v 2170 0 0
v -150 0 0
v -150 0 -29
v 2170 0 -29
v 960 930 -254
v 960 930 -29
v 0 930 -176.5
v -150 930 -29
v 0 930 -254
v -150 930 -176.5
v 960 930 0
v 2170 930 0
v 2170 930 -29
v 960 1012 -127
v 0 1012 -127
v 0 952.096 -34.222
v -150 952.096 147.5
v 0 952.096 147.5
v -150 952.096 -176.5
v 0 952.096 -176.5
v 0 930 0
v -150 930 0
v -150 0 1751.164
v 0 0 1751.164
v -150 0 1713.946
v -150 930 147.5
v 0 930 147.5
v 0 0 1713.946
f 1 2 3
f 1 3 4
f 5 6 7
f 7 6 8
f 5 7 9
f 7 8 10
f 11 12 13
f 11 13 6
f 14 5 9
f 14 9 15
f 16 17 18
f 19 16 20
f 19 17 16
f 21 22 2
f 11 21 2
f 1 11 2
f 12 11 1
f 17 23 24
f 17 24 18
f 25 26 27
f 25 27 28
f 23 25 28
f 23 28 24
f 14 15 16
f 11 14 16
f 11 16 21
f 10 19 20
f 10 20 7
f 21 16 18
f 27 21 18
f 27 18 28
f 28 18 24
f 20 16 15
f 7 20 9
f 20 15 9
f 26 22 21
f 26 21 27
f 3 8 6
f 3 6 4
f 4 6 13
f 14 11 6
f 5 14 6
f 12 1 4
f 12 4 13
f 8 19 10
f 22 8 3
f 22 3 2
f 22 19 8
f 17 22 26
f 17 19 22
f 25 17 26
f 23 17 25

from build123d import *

# Parameters (mm, degrees)
SKETCH1_W           = 2170
SKETCH1_H           = 930
SKETCH1_W_2         = 150
BOSS_EXTRUDE1_DEPTH = 29
BOSS_EXTRUDE2_DEPTH = 150
BOSS_EXTRUDE3_DEPTH = 960


with BuildPart() as part:
    # Sketch1 → Boss-Extrude1 (new body)
    with BuildSketch(Plane.XY):
        with Locations((1085, 465)):
            Rectangle(SKETCH1_W, SKETCH1_H)
        with Locations((-75, 465)):
            Rectangle(SKETCH1_W_2, SKETCH1_H)
    extrude(amount=-BOSS_EXTRUDE1_DEPTH)

    # Sketch2 → Boss-Extrude2 (add)
    with BuildSketch(Plane.ZY.offset(150)):
        Polygon((0, 930), (147.5, 930), (147.5, 952.096276874), (-176.5, 952.096276874), (-176.5, 930), (-29, 930), align=None)
        Polygon((1751.163829973, 0), (147.5, 952.096276874), (147.5, 930), (1713.945955204, 0), align=None)
    extrude(amount=-BOSS_EXTRUDE2_DEPTH)

    # Sketch3 → Boss-Extrude3 (add)
    with BuildSketch(Plane(origin=(0, 0, 0), x_dir=(0, 0, -1), z_dir=(1, 0, 0))):
        Polygon((0, 930), (254, 930), (127, 1012), align=None)
    extrude(amount=BOSS_EXTRUDE3_DEPTH)


solid = part.part
